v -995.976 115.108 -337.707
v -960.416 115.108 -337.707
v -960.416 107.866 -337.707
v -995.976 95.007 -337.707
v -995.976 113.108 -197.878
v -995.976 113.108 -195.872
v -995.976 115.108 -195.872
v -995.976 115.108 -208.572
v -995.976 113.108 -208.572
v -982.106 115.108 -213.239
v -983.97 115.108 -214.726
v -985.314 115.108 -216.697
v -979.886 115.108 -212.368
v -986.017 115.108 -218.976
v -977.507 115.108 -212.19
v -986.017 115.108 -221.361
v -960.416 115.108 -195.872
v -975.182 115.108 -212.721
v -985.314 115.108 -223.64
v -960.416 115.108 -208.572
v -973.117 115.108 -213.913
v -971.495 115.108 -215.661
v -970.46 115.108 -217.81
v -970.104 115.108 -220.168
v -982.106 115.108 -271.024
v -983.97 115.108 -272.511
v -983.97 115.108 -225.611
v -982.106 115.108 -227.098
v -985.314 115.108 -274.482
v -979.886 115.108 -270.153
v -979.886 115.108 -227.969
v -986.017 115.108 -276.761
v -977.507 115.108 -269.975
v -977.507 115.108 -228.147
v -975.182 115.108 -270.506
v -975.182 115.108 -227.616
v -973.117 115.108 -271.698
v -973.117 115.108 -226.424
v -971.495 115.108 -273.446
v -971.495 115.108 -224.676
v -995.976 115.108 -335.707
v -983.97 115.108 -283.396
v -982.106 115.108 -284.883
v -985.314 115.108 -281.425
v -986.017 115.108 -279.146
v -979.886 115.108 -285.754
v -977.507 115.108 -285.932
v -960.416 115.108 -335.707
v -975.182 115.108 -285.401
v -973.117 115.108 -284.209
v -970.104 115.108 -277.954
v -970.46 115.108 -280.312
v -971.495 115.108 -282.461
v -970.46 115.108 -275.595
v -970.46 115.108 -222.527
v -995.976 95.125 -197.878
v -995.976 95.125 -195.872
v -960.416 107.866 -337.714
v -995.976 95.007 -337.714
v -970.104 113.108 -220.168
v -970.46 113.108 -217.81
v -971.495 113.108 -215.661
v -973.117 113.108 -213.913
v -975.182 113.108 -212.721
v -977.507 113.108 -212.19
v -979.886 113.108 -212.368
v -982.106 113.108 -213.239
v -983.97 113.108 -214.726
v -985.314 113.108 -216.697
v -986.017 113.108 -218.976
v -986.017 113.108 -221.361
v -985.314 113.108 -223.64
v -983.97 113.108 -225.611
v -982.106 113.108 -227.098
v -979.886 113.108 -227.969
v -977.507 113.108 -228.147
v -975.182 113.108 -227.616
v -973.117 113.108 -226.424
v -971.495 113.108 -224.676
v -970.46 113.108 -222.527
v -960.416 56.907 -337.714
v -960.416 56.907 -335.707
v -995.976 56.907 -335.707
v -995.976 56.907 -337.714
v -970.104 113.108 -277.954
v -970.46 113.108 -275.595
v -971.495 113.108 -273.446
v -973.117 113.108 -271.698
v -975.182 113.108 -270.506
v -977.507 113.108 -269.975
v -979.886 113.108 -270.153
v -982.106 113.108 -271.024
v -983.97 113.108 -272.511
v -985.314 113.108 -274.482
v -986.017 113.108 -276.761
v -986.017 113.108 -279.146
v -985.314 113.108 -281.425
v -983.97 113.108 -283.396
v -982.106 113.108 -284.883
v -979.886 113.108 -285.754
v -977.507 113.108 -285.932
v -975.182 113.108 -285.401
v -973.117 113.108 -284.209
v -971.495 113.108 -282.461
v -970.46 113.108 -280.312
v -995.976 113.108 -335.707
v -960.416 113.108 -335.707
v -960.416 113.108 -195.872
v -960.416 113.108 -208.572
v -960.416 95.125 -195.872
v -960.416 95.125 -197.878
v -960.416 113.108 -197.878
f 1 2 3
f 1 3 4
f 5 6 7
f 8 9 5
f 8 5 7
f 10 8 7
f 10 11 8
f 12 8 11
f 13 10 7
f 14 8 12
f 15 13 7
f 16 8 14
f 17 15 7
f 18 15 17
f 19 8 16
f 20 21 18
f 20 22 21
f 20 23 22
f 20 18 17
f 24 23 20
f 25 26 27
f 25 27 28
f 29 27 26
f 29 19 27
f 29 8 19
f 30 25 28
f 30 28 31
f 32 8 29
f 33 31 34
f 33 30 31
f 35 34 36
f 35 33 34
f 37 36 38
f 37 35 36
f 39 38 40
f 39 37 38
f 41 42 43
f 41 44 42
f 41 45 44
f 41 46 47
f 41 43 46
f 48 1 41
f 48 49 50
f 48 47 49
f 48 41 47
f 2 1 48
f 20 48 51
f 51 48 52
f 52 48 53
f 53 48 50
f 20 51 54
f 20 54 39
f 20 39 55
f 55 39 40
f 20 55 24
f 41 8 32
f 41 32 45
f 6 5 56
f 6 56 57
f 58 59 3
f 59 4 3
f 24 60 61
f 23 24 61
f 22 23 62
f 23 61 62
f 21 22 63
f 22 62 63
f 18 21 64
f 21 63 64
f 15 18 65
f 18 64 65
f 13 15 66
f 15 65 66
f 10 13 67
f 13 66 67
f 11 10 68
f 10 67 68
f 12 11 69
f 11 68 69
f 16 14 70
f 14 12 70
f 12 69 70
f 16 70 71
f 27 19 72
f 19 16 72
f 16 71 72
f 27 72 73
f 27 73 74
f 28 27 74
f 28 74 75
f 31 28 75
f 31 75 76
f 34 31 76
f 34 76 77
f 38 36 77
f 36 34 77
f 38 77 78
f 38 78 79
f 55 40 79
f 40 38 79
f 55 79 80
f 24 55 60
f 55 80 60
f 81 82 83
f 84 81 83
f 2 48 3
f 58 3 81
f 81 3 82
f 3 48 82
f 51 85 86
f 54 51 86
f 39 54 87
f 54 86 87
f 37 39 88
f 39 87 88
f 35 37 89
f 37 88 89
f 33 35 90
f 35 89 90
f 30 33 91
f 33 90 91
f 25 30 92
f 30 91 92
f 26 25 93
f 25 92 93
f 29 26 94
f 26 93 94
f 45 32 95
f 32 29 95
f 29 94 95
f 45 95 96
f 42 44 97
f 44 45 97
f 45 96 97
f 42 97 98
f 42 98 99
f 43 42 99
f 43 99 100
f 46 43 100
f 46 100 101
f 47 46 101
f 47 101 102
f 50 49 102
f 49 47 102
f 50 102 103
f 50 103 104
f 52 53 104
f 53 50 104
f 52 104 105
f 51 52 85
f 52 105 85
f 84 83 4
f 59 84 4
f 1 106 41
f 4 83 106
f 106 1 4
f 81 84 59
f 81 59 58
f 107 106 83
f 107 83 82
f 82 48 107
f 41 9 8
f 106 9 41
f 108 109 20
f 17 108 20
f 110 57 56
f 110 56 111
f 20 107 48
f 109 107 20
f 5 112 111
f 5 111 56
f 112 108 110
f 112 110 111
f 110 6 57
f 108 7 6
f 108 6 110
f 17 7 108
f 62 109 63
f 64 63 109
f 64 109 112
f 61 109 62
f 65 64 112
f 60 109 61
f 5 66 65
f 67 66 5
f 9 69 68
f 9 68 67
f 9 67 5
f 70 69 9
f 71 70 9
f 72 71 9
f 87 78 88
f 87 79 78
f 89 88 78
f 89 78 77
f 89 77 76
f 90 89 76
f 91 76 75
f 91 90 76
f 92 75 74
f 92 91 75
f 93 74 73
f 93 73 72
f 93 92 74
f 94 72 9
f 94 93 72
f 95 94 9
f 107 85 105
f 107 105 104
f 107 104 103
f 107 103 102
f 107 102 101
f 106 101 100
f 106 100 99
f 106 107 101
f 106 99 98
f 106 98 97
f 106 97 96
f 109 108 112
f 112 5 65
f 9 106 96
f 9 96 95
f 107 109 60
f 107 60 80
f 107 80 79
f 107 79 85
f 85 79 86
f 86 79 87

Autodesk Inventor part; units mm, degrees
ref_plane "YZ Plane" through (0, 0, 0) normal (1, 0, 0) x (0, 1, 0)
ref_plane "XZ Plane" through (0, 0, 0) normal (0, 1, 0) x (-1, 0, 0)
ref_plane "XY Plane" through (0, 0, 0) normal (0, 0, 1) x (1, 0, 0)
ref_plane "Plano de trabalho5" through (-1094.0332, 113.1084, -225.312) normal (0, 1, 0) x (1, 0, 0)
sketch "Esboço10" plane through (-1094.0332, 113.1084, -225.312) normal (0, 1, 0) x (1, 0, 0)
  line L0 (115.9279, 81.534) -> (115.9279, 81.534)
  circle A0 centre (115.9279, -5.1435) radius 8.001
  circle A1 centre (115.9279, 52.6415) radius 8.001
  line L1 (98.0571, -16.7405) -> (133.6171, -16.7405)
  line L2 (133.6171, 68.072) -> (133.6171, 42.672)
  line L3 (133.6171, -16.7405) -> (98.0571, -16.7405)
  line L4 (98.0571, -16.7405) -> (98.0571, 99.695)
  line L5 (133.6171, 99.695) -> (133.6171, -16.7405)
  line L6 (98.0571, 99.695) -> (98.0571, 110.395)
  line L7 (98.0571, 110.395) -> (133.6171, 110.395)
  line L8 (133.6171, 110.395) -> (133.6171, 99.695)
  line L9 (133.6171, 110.395) -> (98.0571, 110.395)
  line L10 (98.0571, 110.395) -> (98.0571, -16.7405)
  line L11 (98.0571, -16.7405) -> (133.6171, -16.7405)
  line L12 (133.6171, -16.7405) -> (133.6171, 110.395)
  point P0 (1094.0332, -225.312)
  dimension "d30" = 0
  dimension "d35" = 16.002
  dimension "d37" = 16.002
  dimension "d65" = 10.7
extrude "Extrusão9" add sketch "Esboço10" along normal blind 2
sketch "Esboço14" plane through (-960.416, 113.1084, -335.707) normal (0, 0, -1) x (-1, 0, 0)
  line L0 (0, 2) -> (35.56, 2)
  line L1 (35.56, 2) -> (35.56, -18.1014)
  line L2 (0, -5.2428) -> (35.56, -18.1014)
  line L3 (0, -5.2428) -> (0, 2)
  point P0 (-960.416, -113.1084)
extrude "Extrusão12" add sketch "Esboço14" along normal blind 2
sketch "Esboço15" plane through (-960.416, 113.1084, -335.707) normal (0, 0, 1) x (1, 0, 0)
  line L0 (-35.56, -18.1014) -> (-35.56, 2) projected
  line L1 (0, 2) -> (0, -5.2428) projected
  line L2 (-35.56, -18.1014) -> (0, -5.2428)
  line L3 (0, -5.2428) -> (0, -18.1014)
  line L4 (0, -18.1014) -> (-35.56, -18.1014)
  point P0 (960.416, -113.1084)
extrude "Extrusão13" add sketch "Esboço15" against normal blind 2.0066
sketch "Esboço16" plane through (-960.416, 113.1084, -335.707) normal (0, 0, 1) x (1, 0, 0)
  line L0 (-35.56, -18.1014) -> (-35.56, 2) projected
  line L1 (-35.56, -18.1014) -> (0, -18.1014)
  line L2 (0, -18.1014) -> (0, -56.2014)
  line L3 (0, -56.2014) -> (-35.56, -56.2014)
  line L4 (-35.56, -56.2014) -> (-35.56, -18.1014)
  point P0 (960.416, -113.1084)
  dimension "d70" = 38.1
extrude "Extrusão14" add sketch "Esboço16" against normal blind 2.0066
sketch "Esboço17" plane through (-995.976, 113.1084, -208.5715) normal (0, 0, 1) x (1, 0, 0)
  line L0 (35.56, 0) -> (35.56, 2) projected
  line L1 (0, 0) -> (0, 2) projected
  line L2 (35.56, 0) -> (0, 0)
  line L3 (0, 0) -> (0, 2)
  line L4 (0, 2) -> (35.56, 2)
  line L5 (35.56, 2) -> (35.56, 0)
  point P0 (995.976, -113.1084)
extrude "Extrusão15" add sketch "Esboço17" along normal blind 12.7
sketch "Esboço18" plane through (-1094.0332, 113.1084, -225.312) normal (0, -1, 0) x (1, 0, 0)
  line L0 (98.0571, 29.4405) -> (133.6171, 29.4405) projected
  line L1 (133.6171, 29.4405) -> (133.6171, -110.395) projected
  line L2 (98.0571, 29.4405) -> (133.6171, 29.4405)
  line L3 (133.6171, 29.4405) -> (133.6171, 27.4339)
  line L4 (133.6171, 27.4339) -> (98.0571, 27.4339)
  line L5 (98.0571, 27.4339) -> (98.0571, 29.4405)
  point P0 (1094.0332, 225.312)
  dimension "d75" = 2.0066
extrude "Extrusão16" add sketch "Esboço18" along normal blind 17.9832
properties part number "Fixação sem Tanque_2 - DIN"
